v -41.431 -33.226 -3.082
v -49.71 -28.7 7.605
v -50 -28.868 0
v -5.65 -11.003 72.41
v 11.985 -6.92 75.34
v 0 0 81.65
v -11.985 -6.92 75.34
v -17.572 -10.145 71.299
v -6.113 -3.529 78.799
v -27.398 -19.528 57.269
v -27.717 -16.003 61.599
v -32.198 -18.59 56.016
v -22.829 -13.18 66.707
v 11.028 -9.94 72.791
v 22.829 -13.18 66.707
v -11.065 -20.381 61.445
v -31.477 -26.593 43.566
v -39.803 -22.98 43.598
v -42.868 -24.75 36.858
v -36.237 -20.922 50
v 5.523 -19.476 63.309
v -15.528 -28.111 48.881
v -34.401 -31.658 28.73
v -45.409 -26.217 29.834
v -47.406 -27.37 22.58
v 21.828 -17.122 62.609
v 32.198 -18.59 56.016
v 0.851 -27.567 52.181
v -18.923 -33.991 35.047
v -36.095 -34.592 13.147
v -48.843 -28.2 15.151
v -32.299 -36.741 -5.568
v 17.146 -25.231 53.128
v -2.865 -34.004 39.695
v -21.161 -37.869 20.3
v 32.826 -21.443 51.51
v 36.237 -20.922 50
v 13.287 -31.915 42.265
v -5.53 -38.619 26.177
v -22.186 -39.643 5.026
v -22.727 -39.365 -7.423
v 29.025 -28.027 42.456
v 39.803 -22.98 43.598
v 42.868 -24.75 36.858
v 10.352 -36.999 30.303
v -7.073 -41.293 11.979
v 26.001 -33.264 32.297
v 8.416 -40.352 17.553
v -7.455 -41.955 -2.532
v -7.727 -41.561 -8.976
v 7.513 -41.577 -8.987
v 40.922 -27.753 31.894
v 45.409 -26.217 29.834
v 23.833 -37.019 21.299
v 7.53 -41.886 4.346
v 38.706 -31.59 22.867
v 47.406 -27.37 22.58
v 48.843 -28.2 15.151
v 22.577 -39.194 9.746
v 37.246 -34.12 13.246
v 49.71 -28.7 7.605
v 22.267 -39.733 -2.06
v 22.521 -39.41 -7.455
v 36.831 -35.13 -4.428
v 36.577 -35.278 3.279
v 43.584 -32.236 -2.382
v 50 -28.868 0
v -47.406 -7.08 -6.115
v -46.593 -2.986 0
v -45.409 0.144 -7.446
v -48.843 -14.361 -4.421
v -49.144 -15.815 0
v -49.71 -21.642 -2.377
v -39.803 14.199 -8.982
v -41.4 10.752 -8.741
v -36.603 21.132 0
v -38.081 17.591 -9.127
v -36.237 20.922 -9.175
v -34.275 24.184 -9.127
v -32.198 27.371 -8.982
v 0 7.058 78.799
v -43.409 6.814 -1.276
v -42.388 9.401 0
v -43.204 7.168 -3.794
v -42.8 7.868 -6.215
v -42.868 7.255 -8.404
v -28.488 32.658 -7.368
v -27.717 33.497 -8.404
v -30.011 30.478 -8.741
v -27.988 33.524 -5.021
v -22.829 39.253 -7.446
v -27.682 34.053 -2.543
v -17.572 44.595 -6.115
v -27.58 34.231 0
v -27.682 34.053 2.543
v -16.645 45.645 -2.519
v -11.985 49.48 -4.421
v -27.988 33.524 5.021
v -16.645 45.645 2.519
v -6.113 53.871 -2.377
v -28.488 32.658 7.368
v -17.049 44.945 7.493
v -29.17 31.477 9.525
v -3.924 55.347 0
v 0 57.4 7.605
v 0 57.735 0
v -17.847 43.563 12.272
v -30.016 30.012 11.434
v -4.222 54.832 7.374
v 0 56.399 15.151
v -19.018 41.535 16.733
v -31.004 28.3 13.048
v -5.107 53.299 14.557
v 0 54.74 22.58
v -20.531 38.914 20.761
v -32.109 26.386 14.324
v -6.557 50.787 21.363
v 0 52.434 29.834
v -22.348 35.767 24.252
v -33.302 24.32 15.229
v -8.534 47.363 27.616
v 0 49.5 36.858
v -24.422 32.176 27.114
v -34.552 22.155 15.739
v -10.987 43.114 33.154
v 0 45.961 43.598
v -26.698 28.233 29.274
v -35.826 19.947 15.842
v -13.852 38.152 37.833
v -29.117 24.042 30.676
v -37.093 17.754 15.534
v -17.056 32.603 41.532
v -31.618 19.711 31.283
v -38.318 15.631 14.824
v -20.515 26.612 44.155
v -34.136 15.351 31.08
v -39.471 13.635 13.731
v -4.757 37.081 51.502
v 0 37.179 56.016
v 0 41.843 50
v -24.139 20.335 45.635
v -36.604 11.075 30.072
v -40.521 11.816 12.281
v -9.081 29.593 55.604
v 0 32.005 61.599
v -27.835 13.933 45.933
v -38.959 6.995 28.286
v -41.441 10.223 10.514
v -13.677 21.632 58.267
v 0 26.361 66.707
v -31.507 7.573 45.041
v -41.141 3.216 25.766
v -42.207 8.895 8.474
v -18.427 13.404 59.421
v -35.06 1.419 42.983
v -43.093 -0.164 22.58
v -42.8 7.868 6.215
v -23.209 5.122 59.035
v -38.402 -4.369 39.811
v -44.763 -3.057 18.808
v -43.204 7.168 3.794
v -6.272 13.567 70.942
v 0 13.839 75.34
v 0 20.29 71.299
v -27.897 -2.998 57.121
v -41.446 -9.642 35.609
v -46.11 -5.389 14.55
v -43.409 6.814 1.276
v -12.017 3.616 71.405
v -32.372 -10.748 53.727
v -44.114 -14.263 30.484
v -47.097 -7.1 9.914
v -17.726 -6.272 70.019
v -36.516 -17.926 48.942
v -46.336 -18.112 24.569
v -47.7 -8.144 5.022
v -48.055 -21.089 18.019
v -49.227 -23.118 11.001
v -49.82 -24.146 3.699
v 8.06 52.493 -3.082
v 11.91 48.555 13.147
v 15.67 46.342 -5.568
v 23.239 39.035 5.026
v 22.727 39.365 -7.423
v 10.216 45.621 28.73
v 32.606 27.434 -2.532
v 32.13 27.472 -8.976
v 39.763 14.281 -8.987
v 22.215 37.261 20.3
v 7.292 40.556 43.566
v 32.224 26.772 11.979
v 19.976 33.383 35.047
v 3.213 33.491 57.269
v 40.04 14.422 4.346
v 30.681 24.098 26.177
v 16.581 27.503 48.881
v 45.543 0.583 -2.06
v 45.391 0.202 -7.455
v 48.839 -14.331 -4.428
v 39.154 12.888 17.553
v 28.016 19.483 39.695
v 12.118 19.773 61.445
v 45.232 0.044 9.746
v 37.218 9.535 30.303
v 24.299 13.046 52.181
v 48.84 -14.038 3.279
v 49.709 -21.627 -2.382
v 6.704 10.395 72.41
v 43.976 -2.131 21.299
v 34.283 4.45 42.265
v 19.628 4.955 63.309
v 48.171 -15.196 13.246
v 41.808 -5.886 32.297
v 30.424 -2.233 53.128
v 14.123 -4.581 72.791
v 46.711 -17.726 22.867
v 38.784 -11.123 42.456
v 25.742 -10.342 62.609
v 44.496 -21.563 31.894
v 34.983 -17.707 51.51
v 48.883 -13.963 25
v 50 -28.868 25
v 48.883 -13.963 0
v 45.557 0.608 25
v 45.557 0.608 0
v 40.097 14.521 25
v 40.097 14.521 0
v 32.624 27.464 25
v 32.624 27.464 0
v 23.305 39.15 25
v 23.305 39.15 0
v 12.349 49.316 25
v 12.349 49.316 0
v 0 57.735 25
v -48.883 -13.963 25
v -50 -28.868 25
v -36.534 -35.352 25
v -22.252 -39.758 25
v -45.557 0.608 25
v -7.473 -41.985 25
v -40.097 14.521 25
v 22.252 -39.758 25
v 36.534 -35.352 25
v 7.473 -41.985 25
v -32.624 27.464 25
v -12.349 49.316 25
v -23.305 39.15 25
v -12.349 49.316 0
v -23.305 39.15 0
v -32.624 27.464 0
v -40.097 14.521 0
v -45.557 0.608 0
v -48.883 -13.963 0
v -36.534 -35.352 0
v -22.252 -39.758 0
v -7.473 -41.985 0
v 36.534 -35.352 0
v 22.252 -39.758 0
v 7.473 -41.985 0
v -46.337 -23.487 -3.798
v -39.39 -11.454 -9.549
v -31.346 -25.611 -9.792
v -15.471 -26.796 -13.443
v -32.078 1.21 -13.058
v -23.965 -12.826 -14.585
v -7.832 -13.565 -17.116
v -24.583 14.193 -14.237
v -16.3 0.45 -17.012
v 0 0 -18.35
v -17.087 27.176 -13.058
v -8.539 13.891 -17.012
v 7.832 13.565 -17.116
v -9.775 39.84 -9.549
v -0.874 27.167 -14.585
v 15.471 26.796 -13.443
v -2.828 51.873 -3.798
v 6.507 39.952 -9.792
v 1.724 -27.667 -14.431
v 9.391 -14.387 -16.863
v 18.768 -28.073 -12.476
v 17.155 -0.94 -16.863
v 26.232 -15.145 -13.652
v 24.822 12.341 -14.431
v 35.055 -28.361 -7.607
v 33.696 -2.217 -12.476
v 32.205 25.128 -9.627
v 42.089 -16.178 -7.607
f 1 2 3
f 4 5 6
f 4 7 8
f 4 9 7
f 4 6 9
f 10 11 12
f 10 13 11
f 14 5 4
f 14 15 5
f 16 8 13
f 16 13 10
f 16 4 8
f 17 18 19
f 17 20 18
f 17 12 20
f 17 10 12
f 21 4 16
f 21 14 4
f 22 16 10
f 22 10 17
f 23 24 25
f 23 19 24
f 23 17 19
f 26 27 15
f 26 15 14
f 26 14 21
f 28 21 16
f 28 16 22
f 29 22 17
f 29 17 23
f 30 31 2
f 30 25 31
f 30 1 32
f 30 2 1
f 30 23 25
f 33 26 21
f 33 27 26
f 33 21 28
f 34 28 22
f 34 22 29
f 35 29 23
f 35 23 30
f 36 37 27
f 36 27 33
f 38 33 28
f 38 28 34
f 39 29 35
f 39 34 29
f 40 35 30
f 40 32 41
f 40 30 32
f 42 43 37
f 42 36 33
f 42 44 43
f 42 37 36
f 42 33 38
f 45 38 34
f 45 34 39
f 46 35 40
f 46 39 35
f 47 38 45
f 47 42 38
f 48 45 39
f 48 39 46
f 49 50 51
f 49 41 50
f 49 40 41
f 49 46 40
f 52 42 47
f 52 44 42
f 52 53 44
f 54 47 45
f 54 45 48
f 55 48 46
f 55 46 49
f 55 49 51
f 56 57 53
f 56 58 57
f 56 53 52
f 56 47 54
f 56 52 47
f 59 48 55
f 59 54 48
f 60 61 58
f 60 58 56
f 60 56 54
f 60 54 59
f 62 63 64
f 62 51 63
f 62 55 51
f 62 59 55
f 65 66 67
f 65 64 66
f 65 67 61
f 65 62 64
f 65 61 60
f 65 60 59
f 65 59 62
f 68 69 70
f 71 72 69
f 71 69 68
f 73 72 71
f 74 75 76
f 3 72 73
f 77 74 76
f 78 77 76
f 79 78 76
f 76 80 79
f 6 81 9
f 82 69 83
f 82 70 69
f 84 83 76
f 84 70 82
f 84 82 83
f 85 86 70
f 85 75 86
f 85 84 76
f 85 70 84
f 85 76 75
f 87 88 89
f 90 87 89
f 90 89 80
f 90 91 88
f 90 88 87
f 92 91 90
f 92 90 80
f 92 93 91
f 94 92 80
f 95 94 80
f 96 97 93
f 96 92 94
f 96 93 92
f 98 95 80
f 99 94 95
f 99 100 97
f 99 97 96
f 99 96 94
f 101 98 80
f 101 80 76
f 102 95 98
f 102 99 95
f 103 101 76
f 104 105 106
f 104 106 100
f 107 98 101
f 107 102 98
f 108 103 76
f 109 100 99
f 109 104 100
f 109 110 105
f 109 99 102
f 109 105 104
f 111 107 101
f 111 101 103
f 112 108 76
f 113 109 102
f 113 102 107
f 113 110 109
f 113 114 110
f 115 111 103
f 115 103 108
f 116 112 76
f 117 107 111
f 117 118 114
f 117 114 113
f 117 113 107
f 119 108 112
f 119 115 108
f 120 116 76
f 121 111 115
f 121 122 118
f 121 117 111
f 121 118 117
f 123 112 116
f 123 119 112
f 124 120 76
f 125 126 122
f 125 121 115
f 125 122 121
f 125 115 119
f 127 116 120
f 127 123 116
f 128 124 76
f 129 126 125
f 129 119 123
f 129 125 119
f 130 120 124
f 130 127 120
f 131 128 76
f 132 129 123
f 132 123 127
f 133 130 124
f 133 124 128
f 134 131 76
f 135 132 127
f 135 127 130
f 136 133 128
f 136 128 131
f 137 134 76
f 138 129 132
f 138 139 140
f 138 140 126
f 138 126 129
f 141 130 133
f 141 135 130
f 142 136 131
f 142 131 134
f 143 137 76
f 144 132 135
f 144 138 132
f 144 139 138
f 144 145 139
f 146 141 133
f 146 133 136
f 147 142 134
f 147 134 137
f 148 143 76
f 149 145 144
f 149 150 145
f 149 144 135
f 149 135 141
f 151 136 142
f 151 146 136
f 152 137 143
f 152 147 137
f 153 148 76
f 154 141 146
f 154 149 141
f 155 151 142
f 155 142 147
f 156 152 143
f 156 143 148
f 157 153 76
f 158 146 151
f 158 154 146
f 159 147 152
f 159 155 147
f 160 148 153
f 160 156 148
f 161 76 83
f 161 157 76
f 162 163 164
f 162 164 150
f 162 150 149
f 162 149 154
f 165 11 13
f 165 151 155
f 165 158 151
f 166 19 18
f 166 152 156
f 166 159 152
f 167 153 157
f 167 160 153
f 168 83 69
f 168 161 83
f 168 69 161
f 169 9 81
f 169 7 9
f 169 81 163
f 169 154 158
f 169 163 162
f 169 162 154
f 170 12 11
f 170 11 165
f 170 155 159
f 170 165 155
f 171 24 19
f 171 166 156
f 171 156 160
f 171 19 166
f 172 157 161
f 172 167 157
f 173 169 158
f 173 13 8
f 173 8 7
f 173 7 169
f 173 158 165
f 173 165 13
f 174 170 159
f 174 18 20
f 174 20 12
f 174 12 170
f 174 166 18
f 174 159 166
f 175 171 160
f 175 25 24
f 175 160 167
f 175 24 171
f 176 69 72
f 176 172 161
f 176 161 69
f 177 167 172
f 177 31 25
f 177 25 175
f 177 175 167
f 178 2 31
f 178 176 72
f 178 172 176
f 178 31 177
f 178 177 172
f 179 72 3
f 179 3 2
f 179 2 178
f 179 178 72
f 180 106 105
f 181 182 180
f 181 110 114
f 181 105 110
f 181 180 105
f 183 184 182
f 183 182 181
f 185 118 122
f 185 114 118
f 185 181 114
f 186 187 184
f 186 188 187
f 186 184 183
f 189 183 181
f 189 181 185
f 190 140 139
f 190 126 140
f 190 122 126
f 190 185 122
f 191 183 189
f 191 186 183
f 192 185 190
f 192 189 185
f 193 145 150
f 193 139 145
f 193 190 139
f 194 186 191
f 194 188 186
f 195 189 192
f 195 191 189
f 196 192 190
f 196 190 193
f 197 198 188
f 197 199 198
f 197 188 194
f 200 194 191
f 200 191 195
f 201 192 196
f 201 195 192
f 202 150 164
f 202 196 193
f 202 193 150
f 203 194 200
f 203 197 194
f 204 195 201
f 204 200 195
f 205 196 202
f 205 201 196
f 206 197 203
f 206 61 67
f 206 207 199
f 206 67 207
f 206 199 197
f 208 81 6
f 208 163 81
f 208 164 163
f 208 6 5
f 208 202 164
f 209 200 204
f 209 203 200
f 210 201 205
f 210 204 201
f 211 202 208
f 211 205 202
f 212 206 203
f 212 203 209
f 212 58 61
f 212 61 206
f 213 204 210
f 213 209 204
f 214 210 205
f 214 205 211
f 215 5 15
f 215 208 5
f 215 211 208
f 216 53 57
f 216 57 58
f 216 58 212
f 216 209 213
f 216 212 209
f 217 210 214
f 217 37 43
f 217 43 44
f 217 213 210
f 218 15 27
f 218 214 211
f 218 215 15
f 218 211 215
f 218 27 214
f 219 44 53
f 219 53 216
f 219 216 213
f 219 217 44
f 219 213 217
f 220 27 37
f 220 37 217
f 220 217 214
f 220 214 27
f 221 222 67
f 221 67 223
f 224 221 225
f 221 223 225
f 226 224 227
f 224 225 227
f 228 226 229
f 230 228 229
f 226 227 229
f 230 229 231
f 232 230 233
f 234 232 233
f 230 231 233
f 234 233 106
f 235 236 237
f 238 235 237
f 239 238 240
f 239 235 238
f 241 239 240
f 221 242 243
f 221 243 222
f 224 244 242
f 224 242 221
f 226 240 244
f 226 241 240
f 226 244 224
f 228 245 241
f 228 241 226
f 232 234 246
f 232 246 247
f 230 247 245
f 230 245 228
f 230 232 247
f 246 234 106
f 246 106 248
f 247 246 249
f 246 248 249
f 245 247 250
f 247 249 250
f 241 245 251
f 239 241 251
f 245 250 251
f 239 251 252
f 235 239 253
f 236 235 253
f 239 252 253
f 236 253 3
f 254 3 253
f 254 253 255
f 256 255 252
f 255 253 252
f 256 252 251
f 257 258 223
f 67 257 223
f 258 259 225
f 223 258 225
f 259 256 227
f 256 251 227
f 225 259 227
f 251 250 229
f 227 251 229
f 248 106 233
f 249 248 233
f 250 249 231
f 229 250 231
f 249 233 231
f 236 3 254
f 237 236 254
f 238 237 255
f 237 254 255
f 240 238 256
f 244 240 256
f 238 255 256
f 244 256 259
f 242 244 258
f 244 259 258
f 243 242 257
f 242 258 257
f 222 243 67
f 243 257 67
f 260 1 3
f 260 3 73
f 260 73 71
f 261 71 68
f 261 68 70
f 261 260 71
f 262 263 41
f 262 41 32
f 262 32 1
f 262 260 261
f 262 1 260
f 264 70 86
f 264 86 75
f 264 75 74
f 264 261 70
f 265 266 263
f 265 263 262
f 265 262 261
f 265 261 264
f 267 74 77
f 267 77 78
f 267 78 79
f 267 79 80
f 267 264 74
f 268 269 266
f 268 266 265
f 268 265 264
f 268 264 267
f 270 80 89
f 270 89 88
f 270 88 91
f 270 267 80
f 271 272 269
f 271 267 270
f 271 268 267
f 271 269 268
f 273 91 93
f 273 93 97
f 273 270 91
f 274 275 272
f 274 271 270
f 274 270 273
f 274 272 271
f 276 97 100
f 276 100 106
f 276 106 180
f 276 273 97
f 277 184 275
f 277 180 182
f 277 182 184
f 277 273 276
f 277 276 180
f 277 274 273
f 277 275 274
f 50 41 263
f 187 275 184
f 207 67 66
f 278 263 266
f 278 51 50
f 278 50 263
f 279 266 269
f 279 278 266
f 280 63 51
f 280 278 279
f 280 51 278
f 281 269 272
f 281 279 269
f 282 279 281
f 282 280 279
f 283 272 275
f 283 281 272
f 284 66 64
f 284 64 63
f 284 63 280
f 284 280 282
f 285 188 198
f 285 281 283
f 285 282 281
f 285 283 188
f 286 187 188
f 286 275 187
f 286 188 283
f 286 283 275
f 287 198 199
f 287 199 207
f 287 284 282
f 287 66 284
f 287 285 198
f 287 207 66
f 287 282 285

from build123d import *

# Parameters (mm, degrees)
F7_DEPTH = 25


with BuildPart() as f1:
    # F0 (on Top) → F1 (revolve)
    with BuildSketch(Plane.XY):
        with BuildLine():
            ThreePointArc((-50, -28.8675134595), (-36.6025403784, 21.1324865405), (0, 57.735026919))
            Line((0, 57.735026919), (-86.6025403784, 107.735026919))
            ThreePointArc((-86.6025403784, 107.735026919), (-96.5925826289, 31.8531224087), (-50, -28.8675134595))
        make_face()
        with BuildLine():
            ThreePointArc((50, -28.8675134595), (70.7106781187, -12.9756511997), (86.6025403784, 7.735026919))
            Line((86.6025403784, 7.735026919), (0, 57.735026919))
            ThreePointArc((0, 57.735026919), (36.6025403784, 21.1324865405), (50, -28.8675134595))
        make_face()
        with BuildLine():
            ThreePointArc((0, -42.264973081), (25.8819045103, -38.8575557099), (50, -28.8675134595))
            ThreePointArc((50, -28.8675134595), (36.6025403784, 21.1324865405), (0, 57.735026919))
            ThreePointArc((0, 57.735026919), (-36.6025403784, 21.1324865405), (-50, -28.8675134595))
            ThreePointArc((-50, -28.8675134595), (-25.8819045103, -38.8575557099), (0, -42.264973081))
        make_face()
    revolve(axis=Axis((0, 57.735026919, 0), (0.8660254038, -0.5, 0)))


with BuildPart() as f3_1:
    # F3: copy of F1
    add(f1.part.moved(Location((50, -86.6025403784, 0))))


with BuildPart() as f4_1:
    # F4: copy of F1
    add(f1.part.moved(Location((-50, -86.6025403784, 0))))


with BuildPart() as f5_1:
    # F5: copy of F1
    add(f1.part.moved(Location((0, -57.735026919, 81.6496580928))))

    # F6: intersect F3_1, F4_1, F1
    add(f3_1.part, mode=Mode.INTERSECT)
    add(f4_1.part, mode=Mode.INTERSECT)
    add(f1.part, mode=Mode.INTERSECT)


with BuildPart() as f7:
    # F0 (on Top) → F7 (new body)
    with BuildSketch(Plane.XY):
        with BuildLine():
            ThreePointArc((0, -42.264973081), (25.8819045103, -38.8575557099), (50, -28.8675134595))
            ThreePointArc((50, -28.8675134595), (36.6025403784, 21.1324865405), (0, 57.735026919))
            ThreePointArc((0, 57.735026919), (-36.6025403784, 21.1324865405), (-50, -28.8675134595))
            ThreePointArc((-50, -28.8675134595), (-25.8819045103, -38.8575557099), (0, -42.264973081))
        make_face()
    extrude(amount=F7_DEPTH)


solid = Compound([f5_1.part, f7.part])
